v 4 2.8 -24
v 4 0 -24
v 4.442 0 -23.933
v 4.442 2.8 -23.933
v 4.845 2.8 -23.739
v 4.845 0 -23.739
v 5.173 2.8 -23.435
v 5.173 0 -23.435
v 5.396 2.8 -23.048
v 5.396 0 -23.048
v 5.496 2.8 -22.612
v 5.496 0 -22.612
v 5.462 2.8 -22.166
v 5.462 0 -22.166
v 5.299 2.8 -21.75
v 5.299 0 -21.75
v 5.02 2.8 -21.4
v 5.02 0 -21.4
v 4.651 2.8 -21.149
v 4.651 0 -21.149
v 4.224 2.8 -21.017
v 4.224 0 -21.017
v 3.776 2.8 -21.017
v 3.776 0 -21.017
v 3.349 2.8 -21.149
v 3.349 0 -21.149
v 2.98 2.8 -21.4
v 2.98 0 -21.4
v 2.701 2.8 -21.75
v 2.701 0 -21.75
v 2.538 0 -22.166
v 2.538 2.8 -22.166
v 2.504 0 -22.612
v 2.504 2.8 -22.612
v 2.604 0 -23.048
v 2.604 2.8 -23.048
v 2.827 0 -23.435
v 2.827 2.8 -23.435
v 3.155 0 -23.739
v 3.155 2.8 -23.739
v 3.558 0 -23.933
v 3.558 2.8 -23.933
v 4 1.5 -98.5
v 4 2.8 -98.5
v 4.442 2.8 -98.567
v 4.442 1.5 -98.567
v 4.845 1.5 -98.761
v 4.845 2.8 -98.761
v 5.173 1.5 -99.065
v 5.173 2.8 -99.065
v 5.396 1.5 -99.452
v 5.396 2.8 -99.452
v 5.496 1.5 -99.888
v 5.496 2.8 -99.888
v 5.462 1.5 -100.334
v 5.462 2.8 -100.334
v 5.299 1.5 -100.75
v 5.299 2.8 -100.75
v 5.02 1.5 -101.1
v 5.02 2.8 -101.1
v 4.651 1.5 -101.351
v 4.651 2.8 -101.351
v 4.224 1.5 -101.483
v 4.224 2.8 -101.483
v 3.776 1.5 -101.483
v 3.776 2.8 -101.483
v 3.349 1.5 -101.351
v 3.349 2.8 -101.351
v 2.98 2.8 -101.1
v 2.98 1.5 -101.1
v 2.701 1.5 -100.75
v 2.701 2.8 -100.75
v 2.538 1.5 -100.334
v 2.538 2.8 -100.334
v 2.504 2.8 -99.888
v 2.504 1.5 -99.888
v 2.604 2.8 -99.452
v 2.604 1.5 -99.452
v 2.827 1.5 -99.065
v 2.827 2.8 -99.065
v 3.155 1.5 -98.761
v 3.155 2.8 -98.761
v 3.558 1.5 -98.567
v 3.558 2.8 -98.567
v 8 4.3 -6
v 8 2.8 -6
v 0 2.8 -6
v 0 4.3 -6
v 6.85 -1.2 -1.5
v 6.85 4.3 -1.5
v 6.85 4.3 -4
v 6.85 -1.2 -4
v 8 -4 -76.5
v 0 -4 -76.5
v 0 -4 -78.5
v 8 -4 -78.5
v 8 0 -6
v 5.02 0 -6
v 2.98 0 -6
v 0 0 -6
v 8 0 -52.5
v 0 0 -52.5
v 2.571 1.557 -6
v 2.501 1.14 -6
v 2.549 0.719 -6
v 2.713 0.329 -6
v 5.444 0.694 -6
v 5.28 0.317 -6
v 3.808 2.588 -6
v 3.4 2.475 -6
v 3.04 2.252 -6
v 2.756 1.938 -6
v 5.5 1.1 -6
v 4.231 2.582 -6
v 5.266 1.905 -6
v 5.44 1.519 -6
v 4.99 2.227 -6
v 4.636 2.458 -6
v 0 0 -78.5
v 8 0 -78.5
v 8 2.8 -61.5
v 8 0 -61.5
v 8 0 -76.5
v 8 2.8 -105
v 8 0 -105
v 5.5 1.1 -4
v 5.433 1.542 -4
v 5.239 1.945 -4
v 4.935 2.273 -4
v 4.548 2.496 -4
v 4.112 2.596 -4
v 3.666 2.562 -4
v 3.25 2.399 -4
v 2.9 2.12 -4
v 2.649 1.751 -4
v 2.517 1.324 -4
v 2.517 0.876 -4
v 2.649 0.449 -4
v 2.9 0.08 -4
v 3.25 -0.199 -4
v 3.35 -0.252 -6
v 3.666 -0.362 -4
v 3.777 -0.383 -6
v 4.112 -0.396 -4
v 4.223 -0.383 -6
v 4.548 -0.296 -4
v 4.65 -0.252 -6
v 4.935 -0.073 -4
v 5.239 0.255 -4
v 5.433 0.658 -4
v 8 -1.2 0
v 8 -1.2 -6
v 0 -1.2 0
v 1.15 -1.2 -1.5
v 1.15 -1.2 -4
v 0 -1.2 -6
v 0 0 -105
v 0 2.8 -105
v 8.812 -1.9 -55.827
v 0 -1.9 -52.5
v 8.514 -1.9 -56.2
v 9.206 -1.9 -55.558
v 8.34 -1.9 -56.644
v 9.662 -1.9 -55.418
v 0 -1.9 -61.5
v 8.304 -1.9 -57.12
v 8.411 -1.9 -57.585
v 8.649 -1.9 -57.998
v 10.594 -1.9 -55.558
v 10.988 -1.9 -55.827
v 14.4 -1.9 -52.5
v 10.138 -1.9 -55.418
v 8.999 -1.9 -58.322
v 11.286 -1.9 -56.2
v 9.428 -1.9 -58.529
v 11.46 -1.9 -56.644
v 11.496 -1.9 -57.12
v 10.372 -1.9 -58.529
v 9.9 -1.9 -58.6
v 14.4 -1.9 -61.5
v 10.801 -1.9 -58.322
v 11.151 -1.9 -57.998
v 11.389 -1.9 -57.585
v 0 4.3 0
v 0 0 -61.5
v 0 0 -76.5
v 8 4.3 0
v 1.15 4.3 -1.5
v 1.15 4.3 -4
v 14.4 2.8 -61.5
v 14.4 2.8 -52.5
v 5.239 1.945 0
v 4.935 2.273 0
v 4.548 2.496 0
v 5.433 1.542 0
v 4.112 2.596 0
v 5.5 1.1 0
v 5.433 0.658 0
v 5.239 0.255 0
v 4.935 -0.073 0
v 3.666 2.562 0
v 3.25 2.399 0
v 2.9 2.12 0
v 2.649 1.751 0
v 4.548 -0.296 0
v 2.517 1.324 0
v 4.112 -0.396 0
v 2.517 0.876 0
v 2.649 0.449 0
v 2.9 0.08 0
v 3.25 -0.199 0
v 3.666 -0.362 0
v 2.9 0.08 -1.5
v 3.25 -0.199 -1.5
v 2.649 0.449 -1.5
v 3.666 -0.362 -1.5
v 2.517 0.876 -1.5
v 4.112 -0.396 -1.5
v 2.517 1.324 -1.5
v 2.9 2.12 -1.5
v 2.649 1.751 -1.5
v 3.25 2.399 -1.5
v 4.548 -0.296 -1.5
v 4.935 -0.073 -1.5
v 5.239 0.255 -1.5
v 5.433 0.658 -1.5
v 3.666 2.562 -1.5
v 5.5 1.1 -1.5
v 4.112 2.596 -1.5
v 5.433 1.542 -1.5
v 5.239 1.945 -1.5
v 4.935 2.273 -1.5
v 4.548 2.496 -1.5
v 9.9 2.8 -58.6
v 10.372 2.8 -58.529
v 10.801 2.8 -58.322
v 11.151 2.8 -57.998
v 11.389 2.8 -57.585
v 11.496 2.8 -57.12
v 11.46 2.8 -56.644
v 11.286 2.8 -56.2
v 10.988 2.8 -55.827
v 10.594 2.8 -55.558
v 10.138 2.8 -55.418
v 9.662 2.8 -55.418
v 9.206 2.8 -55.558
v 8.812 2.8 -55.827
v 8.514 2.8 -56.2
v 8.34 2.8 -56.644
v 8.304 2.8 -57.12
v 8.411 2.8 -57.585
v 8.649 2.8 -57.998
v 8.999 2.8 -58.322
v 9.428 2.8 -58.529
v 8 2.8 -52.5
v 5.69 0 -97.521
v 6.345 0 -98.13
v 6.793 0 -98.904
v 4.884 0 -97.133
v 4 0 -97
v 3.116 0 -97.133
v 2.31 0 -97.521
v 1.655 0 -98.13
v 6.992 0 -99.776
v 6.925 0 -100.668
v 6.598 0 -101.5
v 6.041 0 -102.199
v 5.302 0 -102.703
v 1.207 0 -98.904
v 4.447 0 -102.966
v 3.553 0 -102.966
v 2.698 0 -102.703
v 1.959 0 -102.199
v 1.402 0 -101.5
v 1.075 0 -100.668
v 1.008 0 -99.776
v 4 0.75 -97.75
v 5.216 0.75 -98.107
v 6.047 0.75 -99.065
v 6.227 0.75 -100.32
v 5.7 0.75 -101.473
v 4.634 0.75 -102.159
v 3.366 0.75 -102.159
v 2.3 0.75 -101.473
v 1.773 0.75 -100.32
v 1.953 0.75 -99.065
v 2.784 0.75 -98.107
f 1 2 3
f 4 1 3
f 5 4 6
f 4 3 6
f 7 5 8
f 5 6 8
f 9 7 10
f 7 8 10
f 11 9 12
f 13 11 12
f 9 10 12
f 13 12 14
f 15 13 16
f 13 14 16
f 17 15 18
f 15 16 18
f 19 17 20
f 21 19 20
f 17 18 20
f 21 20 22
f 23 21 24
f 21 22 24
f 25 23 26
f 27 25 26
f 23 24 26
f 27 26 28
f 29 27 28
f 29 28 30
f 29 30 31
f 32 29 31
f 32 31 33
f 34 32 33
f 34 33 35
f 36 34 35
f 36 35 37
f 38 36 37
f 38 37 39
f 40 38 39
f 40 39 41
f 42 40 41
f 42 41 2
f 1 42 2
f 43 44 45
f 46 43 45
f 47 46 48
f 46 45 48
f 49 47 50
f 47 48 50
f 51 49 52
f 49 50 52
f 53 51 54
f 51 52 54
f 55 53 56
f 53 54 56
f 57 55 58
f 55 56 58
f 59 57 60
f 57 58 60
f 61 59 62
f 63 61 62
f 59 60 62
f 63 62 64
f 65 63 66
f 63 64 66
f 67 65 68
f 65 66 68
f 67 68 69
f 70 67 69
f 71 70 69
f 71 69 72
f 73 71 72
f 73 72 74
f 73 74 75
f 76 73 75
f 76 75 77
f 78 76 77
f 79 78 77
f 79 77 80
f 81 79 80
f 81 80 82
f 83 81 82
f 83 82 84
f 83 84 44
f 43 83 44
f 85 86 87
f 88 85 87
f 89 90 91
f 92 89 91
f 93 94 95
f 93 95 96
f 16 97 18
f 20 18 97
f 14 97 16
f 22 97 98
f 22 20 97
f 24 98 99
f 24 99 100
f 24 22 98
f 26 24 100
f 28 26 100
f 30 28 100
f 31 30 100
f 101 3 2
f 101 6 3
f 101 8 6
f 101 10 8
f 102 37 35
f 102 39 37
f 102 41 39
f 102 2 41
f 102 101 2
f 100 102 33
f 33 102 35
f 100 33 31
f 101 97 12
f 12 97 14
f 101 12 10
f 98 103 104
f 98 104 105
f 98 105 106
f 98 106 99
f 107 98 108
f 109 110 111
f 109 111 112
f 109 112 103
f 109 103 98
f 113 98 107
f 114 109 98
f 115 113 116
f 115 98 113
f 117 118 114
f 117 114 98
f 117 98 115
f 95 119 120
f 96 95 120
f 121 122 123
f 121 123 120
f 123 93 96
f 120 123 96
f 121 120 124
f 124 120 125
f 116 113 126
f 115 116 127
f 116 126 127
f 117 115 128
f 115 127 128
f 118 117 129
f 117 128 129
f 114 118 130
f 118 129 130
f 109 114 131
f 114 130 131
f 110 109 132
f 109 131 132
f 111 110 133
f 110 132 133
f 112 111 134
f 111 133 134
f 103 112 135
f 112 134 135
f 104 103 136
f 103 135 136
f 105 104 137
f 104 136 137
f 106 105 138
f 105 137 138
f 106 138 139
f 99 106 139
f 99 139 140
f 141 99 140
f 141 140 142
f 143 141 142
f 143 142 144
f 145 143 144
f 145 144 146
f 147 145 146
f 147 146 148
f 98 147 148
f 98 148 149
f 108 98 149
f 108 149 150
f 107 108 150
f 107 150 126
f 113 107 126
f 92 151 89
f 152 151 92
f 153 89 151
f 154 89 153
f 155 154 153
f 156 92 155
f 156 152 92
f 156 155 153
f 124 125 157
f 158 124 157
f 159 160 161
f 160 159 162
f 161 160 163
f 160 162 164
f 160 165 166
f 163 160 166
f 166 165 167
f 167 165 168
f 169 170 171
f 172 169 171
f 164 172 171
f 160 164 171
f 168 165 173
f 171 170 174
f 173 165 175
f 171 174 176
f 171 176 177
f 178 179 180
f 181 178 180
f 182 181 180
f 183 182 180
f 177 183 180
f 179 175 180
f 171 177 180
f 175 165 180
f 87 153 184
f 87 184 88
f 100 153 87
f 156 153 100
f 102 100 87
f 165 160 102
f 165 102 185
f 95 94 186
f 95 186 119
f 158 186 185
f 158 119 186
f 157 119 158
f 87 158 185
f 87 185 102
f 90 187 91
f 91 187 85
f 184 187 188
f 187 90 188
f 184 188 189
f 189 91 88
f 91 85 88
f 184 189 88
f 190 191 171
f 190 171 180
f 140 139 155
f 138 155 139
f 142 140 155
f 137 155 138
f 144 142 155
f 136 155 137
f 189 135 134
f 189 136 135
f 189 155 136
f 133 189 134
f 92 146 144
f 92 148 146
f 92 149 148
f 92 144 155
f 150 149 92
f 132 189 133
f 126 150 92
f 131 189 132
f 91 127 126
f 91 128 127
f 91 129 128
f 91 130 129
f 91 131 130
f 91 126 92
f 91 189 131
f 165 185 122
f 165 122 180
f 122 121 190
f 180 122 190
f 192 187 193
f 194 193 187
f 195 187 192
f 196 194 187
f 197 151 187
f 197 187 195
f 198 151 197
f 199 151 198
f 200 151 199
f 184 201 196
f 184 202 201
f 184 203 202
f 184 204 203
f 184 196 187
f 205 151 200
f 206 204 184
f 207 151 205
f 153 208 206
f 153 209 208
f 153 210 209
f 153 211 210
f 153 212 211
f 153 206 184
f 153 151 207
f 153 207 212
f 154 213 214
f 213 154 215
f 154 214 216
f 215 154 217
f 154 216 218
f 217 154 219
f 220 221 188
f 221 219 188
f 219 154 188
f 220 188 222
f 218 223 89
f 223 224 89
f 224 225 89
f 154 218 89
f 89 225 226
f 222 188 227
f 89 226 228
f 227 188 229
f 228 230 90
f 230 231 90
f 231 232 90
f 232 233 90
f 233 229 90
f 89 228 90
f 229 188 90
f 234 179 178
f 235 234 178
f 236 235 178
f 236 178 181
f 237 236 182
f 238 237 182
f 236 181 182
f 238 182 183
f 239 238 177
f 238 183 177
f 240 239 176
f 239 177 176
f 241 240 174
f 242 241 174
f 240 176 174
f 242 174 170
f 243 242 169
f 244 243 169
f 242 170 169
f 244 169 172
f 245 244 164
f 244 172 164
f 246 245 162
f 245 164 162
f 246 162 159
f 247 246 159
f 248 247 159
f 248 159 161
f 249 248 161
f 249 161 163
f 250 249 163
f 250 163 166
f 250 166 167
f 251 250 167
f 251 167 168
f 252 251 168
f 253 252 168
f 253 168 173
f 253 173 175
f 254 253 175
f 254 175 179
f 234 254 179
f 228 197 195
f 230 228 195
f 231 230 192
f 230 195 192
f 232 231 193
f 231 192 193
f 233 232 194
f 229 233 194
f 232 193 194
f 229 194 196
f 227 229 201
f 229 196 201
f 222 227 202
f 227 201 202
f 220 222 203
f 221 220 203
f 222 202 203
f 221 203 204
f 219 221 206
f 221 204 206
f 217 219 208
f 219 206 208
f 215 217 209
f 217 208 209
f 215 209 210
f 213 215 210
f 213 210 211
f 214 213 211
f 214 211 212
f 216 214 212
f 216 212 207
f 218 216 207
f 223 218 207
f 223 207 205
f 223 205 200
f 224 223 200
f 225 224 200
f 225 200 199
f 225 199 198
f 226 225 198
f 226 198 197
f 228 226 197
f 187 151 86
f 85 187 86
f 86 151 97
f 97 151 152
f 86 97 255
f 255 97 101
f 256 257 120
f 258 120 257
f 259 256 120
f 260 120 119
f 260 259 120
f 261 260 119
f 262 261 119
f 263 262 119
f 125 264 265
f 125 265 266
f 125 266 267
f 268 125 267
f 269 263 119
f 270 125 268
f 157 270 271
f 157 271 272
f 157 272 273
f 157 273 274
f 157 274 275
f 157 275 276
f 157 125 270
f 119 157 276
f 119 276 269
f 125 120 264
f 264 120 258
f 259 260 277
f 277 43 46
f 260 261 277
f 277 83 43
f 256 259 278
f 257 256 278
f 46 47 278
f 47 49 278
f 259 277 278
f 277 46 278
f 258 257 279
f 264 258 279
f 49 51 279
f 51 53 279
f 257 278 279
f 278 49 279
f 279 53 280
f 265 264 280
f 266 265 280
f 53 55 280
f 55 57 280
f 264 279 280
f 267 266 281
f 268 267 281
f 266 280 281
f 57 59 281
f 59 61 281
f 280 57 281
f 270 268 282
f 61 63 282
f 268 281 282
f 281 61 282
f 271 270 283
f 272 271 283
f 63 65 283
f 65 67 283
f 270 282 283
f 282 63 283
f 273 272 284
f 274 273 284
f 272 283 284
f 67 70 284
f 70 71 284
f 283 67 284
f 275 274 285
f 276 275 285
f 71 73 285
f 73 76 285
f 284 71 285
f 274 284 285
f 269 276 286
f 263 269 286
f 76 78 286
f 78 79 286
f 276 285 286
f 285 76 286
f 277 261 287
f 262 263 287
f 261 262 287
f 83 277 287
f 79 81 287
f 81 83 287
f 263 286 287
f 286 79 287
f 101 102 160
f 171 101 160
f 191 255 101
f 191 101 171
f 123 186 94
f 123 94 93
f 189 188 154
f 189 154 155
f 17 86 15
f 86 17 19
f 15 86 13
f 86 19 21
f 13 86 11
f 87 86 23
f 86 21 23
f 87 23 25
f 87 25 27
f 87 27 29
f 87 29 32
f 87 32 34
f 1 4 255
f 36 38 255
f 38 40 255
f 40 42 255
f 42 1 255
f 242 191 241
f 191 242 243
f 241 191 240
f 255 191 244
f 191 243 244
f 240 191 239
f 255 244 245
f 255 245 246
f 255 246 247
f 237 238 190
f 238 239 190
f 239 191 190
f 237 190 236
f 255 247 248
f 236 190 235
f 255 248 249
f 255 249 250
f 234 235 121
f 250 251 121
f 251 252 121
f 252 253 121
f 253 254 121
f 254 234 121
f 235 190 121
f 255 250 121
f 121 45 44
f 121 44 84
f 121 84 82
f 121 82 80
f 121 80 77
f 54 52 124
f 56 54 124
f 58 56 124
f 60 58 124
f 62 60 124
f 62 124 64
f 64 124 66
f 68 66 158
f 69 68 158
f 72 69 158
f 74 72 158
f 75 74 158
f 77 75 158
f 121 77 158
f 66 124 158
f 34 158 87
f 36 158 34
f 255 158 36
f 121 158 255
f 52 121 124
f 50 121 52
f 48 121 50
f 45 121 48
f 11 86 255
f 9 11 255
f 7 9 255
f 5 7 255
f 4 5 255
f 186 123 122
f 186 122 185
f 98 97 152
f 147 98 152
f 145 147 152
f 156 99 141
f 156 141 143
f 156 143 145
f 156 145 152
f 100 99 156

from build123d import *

# Parameters (mm, degrees)
BOSS_EXTRUDE1_DEPTH      = 2.8
CUT_EXTRUDE1_REACH       = 4.8
SKETCH3_R                = 1.5
CHAMFER1_SIZE            = 1.5
SKETCH6_W                = 8
SKETCH6_H                = 6
BOSS_EXTRUDE3_DEPTH      = 1.2
BOSS_EXTRUDE3_DEPTH_BACK = 4.3
SKETCH7_R                = 1.5
CUT_EXTRUDE3_DEPTH       = 6
SKETCH8_W                = 5.7
SKETCH8_H                = 2.5
CUT_EXTRUDE4_DEPTH       = 7
SKETCH9_W                = 14.4
SKETCH9_H                = 9
BOSS_EXTRUDE4_DEPTH      = 4.7
CUT_EXTRUDE5_REACH       = 8.2
SKETCH10_R               = 1.6
SKETCH10_R_2             = 1.5
SKETCH11_W               = 8
SKETCH11_H               = 2
BOSS_EXTRUDE5_DEPTH      = 4


with BuildPart() as part:
    # Sketch2 → Boss-Extrude1 (new body)
    with BuildSketch(Plane(origin=(0, 0, 0), x_dir=(1, 0, 0), z_dir=(0, 1, 0))):
        Polygon((0, 0), (0, 37.522747897), (0, 55), (0, 105), (4, 105), (8, 105), (8, 55), (8, 37.522747897), (8, 0), align=None)
    extrude(amount=BOSS_EXTRUDE1_DEPTH)

    # Sketch3 → Cut-Extrude1 (cut, up to next)
    with BuildSketch(Plane(origin=(0, 2.8, 0), x_dir=(1, 0, 0), z_dir=(0, 1, 0)), mode=Mode.PRIVATE) as cut_extrude1_sk1:
        with Locations(Location((4, 100, 0), (0, 0, 270))):  # turned: the seam where the file's is
            Circle(SKETCH3_R)
    cut_extrude1_tool1 = extrude(cut_extrude1_sk1.sketch, amount=-CUT_EXTRUDE1_REACH, mode=Mode.PRIVATE) & part.part
    add(cut_extrude1_tool1.solids().sort_by_distance((4, 2.8, -100))[0], mode=Mode.SUBTRACT)

    # Chamfer1
    chamfer1_edges = [part.edges().sort_by_distance(p)[0] for p in [
        (4, 0, -101.5),
    ]]
    chamfer(chamfer1_edges, length=CHAMFER1_SIZE)

    # Sketch6 → Boss-Extrude3 (add, two sides)
    with BuildSketch(Plane(origin=(0, 0, 0), x_dir=(-1, 0, 0), z_dir=(0, -1, 0))) as boss_extrude3_sk:
        with Locations((-4, 3)):
            Rectangle(SKETCH6_W, SKETCH6_H)
    extrude(amount=BOSS_EXTRUDE3_DEPTH)
    extrude(boss_extrude3_sk.sketch, amount=-BOSS_EXTRUDE3_DEPTH_BACK)

    # Sketch7 → Cut-Extrude3 (cut)
    with BuildSketch(Plane.XY):
        with Locations((4, 1.1)):
            Circle(SKETCH7_R)
    extrude(amount=-CUT_EXTRUDE3_DEPTH, mode=Mode.SUBTRACT)

    # Sketch8 → Cut-Extrude4 (cut)
    with BuildSketch(Plane(origin=(0, 4.3, 0), x_dir=(1, 0, 0), z_dir=(0, 1, 0))):
        with Locations((4, 2.75)):
            Rectangle(SKETCH8_W, SKETCH8_H)
    extrude(amount=-CUT_EXTRUDE4_DEPTH, mode=Mode.SUBTRACT)

    # Sketch9 → Boss-Extrude4 (add)
    with BuildSketch(Plane(origin=(0, 2.8, 0), x_dir=(1, 0, 0), z_dir=(0, 1, 0))):
        with Locations((7.2, 57)):
            Rectangle(SKETCH9_W, SKETCH9_H)
    extrude(amount=-BOSS_EXTRUDE4_DEPTH)

    # Sketch10 → Cut-Extrude5 (cut, up to next)
    with BuildSketch(Plane.XZ.offset(1.9), mode=Mode.PRIVATE) as cut_extrude5_sk1:
        with Locations(Location((9.9, -57, 0), (0, 0, 270))):  # turned: the seam where the file's is
            Circle(SKETCH10_R)
    cut_extrude5_tool1 = extrude(cut_extrude5_sk1.sketch, amount=-CUT_EXTRUDE5_REACH, mode=Mode.PRIVATE) & part.part
    add(cut_extrude5_tool1.solids().sort_by_distance((9.9, -1.9, -57))[0], mode=Mode.SUBTRACT)
    # Sketch10 → Cut-Extrude5 (cut, up to next)
    with BuildSketch(Plane.XZ.offset(1.9), mode=Mode.PRIVATE) as cut_extrude5_sk2:
        with Locations(Location((4, -22.5, 0), (0, 0, 270))):  # turned: the seam where the file's is
            Circle(SKETCH10_R_2)
    cut_extrude5_tool2 = extrude(cut_extrude5_sk2.sketch, amount=-CUT_EXTRUDE5_REACH, mode=Mode.PRIVATE) & part.part
    add(cut_extrude5_tool2.solids().sort_by_distance((4, -1.9, -22.5))[0], mode=Mode.SUBTRACT)

    # Sketch11 → Boss-Extrude5 (add)
    with BuildSketch(Plane.XZ):
        with Locations((4, -77.5)):
            Rectangle(SKETCH11_W, SKETCH11_H)
    extrude(amount=BOSS_EXTRUDE5_DEPTH)


solid = part.part
